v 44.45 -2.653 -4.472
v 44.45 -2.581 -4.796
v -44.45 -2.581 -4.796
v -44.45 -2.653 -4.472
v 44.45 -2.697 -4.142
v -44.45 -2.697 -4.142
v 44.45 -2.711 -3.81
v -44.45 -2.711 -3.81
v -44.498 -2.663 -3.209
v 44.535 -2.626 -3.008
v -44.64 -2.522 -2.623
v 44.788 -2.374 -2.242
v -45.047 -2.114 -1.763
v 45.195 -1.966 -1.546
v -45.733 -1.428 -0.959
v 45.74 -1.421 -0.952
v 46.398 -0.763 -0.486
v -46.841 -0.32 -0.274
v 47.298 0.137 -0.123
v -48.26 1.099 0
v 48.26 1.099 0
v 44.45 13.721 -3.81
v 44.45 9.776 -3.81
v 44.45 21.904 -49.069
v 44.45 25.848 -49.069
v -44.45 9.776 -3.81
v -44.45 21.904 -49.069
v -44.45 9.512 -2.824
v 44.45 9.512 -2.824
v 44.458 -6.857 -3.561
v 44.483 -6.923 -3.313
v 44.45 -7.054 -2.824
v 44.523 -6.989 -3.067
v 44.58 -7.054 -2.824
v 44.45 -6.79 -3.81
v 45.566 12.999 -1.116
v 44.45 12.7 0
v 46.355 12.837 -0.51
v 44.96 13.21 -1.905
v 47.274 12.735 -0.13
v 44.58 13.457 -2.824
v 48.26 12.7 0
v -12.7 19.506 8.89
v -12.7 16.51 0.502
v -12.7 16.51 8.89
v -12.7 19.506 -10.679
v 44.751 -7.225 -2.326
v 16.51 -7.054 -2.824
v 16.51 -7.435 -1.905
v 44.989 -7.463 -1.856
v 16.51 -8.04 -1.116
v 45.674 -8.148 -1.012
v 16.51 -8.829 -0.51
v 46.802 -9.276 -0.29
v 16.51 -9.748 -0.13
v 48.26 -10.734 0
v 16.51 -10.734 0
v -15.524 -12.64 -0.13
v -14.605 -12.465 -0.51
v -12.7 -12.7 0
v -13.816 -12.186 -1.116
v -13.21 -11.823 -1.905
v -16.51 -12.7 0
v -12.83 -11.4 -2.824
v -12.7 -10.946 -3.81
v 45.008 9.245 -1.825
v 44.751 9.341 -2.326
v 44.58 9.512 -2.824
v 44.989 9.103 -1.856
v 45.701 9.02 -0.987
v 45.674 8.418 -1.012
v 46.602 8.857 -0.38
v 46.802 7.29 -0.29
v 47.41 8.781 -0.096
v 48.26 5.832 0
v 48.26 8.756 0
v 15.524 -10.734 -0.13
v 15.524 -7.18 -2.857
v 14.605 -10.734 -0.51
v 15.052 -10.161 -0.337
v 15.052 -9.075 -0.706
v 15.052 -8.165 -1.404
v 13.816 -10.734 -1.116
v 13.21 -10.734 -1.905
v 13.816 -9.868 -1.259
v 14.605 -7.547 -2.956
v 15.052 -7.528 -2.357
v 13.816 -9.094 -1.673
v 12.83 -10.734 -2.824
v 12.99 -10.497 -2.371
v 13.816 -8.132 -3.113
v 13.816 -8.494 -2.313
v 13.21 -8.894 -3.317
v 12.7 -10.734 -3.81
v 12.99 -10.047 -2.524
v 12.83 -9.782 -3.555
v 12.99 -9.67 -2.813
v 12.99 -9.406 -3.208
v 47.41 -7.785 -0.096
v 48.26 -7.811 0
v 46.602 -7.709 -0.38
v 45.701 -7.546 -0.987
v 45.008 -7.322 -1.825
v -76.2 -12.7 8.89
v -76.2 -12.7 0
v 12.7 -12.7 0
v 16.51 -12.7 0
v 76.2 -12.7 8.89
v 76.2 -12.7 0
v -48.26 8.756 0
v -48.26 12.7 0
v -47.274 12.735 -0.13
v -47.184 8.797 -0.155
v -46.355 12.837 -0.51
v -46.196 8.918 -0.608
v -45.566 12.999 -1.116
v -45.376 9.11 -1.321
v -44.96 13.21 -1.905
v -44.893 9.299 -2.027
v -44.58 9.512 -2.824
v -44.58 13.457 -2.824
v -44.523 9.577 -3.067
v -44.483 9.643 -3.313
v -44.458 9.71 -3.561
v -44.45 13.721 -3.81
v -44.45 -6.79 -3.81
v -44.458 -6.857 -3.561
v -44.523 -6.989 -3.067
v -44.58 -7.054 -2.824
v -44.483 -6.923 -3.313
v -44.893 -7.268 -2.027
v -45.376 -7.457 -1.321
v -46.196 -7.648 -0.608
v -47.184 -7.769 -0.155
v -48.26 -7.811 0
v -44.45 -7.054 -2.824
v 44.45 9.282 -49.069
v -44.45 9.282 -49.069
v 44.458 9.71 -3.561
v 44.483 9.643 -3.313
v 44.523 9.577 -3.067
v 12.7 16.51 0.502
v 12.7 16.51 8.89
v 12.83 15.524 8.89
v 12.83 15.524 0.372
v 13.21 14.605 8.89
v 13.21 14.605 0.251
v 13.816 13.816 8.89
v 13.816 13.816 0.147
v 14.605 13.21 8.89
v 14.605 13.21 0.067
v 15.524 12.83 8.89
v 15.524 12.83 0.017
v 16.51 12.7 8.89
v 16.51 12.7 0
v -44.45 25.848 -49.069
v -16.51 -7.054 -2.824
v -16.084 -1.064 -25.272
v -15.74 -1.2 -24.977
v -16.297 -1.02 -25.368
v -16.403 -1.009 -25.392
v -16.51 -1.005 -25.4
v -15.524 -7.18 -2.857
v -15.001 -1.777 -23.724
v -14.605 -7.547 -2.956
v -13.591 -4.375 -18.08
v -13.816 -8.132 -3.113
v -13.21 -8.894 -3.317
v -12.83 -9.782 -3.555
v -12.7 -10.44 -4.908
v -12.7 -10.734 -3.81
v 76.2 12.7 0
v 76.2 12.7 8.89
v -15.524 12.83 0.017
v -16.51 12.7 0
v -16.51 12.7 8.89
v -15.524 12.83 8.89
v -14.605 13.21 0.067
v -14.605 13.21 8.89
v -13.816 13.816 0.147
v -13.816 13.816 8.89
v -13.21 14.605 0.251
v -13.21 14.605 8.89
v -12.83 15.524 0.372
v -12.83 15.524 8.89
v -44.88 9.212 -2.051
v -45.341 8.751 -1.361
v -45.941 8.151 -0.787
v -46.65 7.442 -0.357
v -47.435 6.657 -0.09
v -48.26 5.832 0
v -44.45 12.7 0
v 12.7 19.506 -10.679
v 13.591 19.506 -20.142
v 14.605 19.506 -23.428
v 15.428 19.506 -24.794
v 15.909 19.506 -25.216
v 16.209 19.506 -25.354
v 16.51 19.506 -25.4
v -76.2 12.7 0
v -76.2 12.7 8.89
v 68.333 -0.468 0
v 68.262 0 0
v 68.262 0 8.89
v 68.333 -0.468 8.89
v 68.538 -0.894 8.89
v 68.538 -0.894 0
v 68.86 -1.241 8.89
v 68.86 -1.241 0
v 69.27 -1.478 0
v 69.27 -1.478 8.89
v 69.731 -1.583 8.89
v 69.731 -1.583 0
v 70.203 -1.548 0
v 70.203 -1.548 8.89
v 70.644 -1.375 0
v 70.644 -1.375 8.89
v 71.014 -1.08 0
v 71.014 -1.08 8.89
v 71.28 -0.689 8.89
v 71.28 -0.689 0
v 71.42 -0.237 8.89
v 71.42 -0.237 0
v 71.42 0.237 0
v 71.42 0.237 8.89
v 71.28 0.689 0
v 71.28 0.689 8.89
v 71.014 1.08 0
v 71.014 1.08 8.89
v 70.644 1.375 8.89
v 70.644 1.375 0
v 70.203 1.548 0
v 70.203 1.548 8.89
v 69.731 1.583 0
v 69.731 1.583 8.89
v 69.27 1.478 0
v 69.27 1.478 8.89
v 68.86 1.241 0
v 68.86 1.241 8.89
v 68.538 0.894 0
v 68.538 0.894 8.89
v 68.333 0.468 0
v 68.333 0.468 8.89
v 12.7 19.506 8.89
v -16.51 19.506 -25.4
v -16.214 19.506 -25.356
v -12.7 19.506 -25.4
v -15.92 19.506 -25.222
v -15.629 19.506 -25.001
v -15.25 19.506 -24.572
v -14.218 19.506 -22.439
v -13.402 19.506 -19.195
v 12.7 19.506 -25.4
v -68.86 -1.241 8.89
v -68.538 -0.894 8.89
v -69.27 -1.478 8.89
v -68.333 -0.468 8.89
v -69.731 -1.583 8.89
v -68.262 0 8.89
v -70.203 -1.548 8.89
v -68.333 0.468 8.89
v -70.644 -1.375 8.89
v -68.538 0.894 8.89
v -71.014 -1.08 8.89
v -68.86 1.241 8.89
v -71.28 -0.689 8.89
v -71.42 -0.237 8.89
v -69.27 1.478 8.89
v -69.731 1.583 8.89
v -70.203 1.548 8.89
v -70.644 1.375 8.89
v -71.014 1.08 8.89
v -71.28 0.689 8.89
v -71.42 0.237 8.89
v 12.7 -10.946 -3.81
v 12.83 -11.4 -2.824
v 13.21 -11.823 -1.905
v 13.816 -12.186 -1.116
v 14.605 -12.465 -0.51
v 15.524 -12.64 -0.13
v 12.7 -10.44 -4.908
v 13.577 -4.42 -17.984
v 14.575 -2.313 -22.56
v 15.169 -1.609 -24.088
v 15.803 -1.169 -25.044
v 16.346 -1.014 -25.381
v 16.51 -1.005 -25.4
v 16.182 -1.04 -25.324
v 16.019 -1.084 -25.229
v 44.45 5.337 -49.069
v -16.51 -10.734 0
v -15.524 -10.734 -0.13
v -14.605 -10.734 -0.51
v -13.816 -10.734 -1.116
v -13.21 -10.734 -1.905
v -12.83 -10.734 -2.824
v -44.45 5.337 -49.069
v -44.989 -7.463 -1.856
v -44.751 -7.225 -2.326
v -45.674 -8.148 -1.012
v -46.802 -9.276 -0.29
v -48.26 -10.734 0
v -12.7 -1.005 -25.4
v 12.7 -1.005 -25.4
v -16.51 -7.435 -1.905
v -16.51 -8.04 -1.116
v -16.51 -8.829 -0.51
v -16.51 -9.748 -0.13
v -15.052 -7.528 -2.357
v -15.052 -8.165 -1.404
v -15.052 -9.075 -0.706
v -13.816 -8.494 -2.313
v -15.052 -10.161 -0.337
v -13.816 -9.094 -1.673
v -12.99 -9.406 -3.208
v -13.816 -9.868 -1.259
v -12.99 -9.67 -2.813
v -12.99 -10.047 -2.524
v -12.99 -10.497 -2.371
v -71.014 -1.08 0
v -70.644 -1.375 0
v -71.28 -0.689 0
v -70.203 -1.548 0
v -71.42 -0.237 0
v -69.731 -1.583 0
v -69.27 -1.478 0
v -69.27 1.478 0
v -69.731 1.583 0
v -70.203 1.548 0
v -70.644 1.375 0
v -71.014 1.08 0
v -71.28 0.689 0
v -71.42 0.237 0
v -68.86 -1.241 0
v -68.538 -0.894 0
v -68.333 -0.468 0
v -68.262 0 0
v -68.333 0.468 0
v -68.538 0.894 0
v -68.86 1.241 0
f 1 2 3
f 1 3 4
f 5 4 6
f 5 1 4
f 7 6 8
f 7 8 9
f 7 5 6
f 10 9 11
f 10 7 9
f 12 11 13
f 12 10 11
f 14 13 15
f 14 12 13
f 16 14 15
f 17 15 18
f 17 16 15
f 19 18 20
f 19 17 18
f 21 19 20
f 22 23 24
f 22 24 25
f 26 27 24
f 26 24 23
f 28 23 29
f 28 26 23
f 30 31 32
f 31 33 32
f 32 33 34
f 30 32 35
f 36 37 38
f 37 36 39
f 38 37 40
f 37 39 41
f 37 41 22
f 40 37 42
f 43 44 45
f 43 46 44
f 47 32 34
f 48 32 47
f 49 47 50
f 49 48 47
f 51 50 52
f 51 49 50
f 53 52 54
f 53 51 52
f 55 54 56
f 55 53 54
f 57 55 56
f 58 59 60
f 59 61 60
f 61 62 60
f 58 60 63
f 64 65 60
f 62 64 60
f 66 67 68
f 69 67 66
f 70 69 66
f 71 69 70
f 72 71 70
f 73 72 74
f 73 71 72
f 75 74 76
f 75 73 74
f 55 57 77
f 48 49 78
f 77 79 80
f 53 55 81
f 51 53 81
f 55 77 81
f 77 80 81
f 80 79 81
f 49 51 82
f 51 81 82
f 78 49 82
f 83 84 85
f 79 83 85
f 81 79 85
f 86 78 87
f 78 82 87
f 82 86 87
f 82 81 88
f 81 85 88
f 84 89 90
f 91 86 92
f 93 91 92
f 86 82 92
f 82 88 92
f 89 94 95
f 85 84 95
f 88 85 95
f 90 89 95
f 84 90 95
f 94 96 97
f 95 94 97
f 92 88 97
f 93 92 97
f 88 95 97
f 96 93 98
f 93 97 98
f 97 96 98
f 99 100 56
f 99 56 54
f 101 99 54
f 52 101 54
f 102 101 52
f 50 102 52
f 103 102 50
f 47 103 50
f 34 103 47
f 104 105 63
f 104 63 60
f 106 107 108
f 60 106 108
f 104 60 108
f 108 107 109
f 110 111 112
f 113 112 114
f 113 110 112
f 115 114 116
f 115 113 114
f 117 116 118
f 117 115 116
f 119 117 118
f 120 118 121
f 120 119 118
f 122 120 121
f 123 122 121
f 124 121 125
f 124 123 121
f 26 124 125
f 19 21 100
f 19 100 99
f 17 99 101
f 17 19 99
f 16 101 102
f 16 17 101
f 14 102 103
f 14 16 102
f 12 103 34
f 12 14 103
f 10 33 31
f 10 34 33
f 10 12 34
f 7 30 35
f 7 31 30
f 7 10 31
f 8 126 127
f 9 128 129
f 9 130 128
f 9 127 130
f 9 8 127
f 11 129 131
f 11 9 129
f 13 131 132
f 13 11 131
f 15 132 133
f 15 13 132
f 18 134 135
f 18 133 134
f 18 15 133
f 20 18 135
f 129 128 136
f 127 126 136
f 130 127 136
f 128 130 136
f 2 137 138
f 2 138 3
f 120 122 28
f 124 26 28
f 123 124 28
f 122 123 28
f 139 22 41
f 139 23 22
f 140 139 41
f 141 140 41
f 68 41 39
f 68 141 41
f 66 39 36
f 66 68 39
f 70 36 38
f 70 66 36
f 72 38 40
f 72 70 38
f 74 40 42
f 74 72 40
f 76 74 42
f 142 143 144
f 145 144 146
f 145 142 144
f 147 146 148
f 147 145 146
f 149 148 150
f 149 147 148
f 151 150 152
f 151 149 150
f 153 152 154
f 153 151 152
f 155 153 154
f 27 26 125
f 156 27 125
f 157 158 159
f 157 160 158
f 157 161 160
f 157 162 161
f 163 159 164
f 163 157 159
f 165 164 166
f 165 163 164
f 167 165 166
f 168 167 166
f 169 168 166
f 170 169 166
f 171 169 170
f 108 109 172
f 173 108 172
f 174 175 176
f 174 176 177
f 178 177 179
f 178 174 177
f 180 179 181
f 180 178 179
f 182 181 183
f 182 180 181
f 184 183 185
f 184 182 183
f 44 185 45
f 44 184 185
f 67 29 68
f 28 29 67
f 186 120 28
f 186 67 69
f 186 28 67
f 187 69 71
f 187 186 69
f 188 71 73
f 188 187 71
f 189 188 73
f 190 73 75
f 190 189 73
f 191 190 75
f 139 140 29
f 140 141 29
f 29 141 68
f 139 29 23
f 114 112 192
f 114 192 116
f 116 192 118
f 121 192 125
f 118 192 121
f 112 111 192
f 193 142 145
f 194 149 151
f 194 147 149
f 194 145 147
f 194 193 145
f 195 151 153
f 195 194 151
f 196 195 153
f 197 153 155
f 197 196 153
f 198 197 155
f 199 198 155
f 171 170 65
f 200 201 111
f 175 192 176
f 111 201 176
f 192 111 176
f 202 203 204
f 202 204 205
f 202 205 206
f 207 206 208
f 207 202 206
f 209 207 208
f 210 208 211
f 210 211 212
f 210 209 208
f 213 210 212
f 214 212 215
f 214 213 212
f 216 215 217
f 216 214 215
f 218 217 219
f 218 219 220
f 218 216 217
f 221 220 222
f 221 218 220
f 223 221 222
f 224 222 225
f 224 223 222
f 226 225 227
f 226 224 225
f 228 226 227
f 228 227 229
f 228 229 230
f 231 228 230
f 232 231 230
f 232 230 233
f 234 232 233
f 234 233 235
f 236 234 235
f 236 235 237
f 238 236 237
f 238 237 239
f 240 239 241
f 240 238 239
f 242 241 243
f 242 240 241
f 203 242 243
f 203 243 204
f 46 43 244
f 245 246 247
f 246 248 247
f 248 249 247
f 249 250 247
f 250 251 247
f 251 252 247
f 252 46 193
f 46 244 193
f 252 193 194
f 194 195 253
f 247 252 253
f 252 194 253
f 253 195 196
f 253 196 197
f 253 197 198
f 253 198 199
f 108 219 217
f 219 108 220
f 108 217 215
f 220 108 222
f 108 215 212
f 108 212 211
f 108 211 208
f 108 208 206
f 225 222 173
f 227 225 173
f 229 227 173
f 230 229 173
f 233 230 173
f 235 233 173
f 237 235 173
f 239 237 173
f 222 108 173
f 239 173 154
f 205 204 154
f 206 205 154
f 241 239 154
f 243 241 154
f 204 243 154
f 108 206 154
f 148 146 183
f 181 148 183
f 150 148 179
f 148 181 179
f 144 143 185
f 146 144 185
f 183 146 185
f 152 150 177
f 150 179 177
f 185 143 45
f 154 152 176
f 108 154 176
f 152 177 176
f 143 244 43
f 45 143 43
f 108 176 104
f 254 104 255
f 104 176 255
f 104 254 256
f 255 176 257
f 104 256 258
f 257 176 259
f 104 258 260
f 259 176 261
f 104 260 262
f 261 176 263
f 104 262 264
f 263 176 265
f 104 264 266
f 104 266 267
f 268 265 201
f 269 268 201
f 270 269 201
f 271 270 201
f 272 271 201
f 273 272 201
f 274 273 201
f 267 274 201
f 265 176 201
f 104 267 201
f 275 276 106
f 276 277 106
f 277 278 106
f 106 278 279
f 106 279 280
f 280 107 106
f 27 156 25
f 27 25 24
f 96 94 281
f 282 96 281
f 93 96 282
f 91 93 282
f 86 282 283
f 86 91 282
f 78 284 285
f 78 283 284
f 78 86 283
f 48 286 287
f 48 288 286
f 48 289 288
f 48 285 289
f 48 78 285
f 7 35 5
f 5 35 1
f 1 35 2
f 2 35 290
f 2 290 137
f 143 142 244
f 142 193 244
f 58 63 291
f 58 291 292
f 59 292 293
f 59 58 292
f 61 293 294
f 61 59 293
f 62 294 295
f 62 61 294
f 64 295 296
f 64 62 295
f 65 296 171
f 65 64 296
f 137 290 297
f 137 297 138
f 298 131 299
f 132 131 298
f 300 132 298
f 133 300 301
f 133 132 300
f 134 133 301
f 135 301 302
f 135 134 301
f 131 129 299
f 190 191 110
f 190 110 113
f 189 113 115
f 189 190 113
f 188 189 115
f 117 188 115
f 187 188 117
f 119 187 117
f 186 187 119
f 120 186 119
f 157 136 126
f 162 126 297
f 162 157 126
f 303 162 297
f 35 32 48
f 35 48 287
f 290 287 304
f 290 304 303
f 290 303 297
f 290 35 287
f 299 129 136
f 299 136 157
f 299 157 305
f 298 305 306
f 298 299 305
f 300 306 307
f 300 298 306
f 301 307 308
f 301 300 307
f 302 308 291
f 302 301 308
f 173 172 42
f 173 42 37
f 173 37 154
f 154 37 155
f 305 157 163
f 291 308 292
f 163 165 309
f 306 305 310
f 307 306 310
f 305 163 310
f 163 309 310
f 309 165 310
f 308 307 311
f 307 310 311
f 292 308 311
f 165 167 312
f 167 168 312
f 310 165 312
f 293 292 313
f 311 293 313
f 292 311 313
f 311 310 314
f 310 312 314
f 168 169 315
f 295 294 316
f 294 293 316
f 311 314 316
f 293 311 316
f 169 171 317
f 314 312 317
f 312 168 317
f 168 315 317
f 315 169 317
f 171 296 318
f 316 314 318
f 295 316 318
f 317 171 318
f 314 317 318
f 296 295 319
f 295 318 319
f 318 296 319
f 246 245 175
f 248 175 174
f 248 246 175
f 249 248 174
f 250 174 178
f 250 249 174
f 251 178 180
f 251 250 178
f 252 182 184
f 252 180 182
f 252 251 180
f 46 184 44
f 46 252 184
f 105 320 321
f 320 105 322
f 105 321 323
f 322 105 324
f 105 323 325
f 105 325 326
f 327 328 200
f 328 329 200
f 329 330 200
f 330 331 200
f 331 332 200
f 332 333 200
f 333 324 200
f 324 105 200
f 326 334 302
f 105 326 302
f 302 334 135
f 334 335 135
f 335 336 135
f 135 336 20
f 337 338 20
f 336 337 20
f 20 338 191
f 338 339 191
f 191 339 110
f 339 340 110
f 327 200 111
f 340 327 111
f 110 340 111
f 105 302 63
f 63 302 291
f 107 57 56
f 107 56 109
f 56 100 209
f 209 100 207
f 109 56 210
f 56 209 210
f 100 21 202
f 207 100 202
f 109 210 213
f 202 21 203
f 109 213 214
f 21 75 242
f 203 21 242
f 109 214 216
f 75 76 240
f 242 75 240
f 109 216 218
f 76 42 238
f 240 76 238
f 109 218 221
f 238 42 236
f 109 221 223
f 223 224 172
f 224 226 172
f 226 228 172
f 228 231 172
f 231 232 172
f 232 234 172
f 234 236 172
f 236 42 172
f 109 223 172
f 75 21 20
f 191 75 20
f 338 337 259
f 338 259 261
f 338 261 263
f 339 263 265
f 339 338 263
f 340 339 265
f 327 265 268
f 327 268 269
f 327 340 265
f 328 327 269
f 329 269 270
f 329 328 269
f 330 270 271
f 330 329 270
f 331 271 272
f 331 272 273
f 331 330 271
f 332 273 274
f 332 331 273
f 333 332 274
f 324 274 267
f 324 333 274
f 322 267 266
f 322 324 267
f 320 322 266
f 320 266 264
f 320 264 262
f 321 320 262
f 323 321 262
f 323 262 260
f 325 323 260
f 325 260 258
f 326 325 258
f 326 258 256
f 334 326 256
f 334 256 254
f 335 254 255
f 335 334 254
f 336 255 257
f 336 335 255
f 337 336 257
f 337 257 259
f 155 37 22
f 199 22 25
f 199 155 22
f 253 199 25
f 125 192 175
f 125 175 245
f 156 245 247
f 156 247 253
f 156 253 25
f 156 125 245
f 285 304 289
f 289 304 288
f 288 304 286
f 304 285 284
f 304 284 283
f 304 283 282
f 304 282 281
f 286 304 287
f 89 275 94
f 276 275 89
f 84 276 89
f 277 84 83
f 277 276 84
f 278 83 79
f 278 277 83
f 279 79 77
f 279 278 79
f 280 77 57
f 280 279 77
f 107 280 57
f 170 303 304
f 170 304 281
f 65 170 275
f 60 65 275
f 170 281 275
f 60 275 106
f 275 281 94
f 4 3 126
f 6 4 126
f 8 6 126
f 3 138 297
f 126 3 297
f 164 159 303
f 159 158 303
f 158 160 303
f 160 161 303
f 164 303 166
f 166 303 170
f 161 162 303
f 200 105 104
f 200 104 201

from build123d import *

# Parameters (mm, degrees)
SKETCH1_W           = 152.4
SKETCH1_H           = 25.4
SKETCH1_R           = 1.5875
BOSS_EXTRUDE1_DEPTH = 8.89
BOSS_EXTRUDE2_DEPTH = 44.45
BOSS_EXTRUDE3_DEPTH = 12.7
FILLET1_R           = 3.81


with BuildPart() as part:
    # Sketch1 → Boss-Extrude1 (new body)
    with BuildSketch(Plane.XY):
        Rectangle(SKETCH1_W, SKETCH1_H)
        with Locations((-69.85, 0)):
            Circle(SKETCH1_R, mode=Mode.SUBTRACT)
        with Locations(Location((69.85, 0, 0), (0, 0, 180))):
            Circle(SKETCH1_R, mode=Mode.SUBTRACT)
    extrude(amount=BOSS_EXTRUDE1_DEPTH)

    # Sketch2 → Boss-Extrude2 (add, symmetric)
    with BuildSketch(Plane(origin=(0, 0, 0), x_dir=(0, 0, -1), z_dir=(1, 0, 0))):
        Polygon((0, 8.755597753), (0, 12.7), (49.069031975, 25.848007491), (49.069031975, 21.903605244), align=None)
        Polygon((0, -3.866489439), (0, -7.810891686), (49.069031975, 5.337115805), (49.069031975, 9.281518052), align=None)
    extrude(amount=BOSS_EXTRUDE2_DEPTH, both=True)

    # Sketch3 → Boss-Extrude3 (add, symmetric)
    with BuildSketch(Plane(origin=(0, 0, 0), x_dir=(0, 0, -1), z_dir=(1, 0, 0))):
        Polygon((-8.89, 12.7), (-8.89, 19.505909488), (25.4, 19.505909488), (0, 12.7), align=None)
        Polygon((25.4, -1.004982199), (0, -12.7), (0, -7.810891686), align=None)
    extrude(amount=BOSS_EXTRUDE3_DEPTH, both=True)

    # Fillet1
    # the kernel refuses this fillet: 3.81 mm, written as the material it adds along each edge
    with BuildSketch(Plane(origin=(16.51, -10.73440751, -3.81), x_dir=(0, 0, 1), z_dir=(-1, 0, 0))) as fillet1_piece_1_section:
        Polygon((0, 0), (FILLET1_R, 0), (FILLET1_R, FILLET1_R * 0.767326987979), (FILLET1_R * 0.258819045103, FILLET1_R * 0.965925826289), align=None)
    fillet1_piece_1 = extrude(amount=FILLET1_R, mode=Mode.PRIVATE)
    fillet1_piece_1 = fillet1_piece_1 - Plane(origin=(16.51, -10.73440751, -3.81), x_dir=(0, -0.6087614290087219, -0.7933533402912344), z_dir=(-1, 0, 0)) * Sphere(FILLET1_R, mode=Mode.PRIVATE)
    add(fillet1_piece_1)
    with BuildSketch(Plane(origin=(-16.51, -10.73440751, -3.81), x_dir=(0, 0, 1), z_dir=(1, 0, 0))) as fillet1_piece_2_section:
        Polygon((0, 0), (FILLET1_R, 0), (FILLET1_R, -FILLET1_R * 0.767326987979), (FILLET1_R * 0.258819045103, -FILLET1_R * 0.965925826289), align=None)
    fillet1_piece_2 = extrude(amount=FILLET1_R, mode=Mode.PRIVATE)
    fillet1_piece_2 = fillet1_piece_2 - Plane(origin=(-16.51, -10.73440751, -3.81), x_dir=(0, -0.6087614290087219, -0.7933533402912344), z_dir=(1, 0, 0)) * Sphere(FILLET1_R, mode=Mode.PRIVATE)
    add(fillet1_piece_2)
    with BuildSketch(Plane(origin=(-44.45, 8.755597753, 0), x_dir=(0, -1, 0), z_dir=(1, 0, 0))) as fillet1_piece_3:
        with BuildLine():
            CenterArc((FILLET1_R * 0.767326987979, FILLET1_R), FILLET1_R, 195, 75)
            Line((-FILLET1_R * 0.19859883831, FILLET1_R * 0.741180954897), (0, 0))
            Line((0, 0), (FILLET1_R * 0.767326987979, 0))
        make_face()
    extrude(amount=88.9)
    with BuildSketch(Plane(origin=(-44.45, -0.769402247, 0), x_dir=(-1, 0, 0), z_dir=(0, 1, 0))) as fillet1_piece_4_section:
        with BuildLine():
            CenterArc((FILLET1_R, -FILLET1_R), FILLET1_R, 90, 90)
            Line((0, -FILLET1_R), (0, 0))
            Line((0, 0), (FILLET1_R, 0))
        make_face()
    fillet1_piece_4 = extrude(amount=13.469402247, mode=Mode.PRIVATE)
    fillet1_piece_4 = split(fillet1_piece_4, bisect_by=Plane(origin=(-45.341111067, 12.778682572, -0.293647356), z_dir=(0, -0.9659258262890691, -0.25881904510251785)), keep=Keep.TOP, mode=Mode.PRIVATE)
    fillet1_piece_4 = split(fillet1_piece_4, bisect_by=Plane(origin=(-45.341111067, 9.098505174, -1.279747918), z_dir=(0, 0.9659258262890691, 0.258819045102518)), keep=Keep.TOP, mode=Mode.PRIVATE)
    add(fillet1_piece_4)
    with BuildSketch(Plane(origin=(-44.45, -0.769402247, 0), x_dir=(-1, 0, 0), z_dir=(0, 1, 0))) as fillet1_piece_5_section:
        with BuildLine():
            CenterArc((FILLET1_R, -FILLET1_R), FILLET1_R, 90, 90)
            Line((0, -FILLET1_R), (0, 0))
            Line((0, 0), (FILLET1_R, 0))
        make_face()
    fillet1_piece_5 = extrude(amount=22.994402247, mode=Mode.PRIVATE)
    fillet1_piece_5 = split(fillet1_piece_5, bisect_by=Plane(origin=(-44.855660273, 12.7, -1.638749777), z_dir=(0, 1, 0)), keep=Keep.TOP, mode=Mode.PRIVATE)
    fillet1_piece_5 = split(fillet1_piece_5, bisect_by=Plane(origin=(-44.855660273, 13.124394562, -1.583862067), z_dir=(0, -0.9659258262890691, -0.25881904510251785)), keep=Keep.TOP, mode=Mode.PRIVATE)
    add(fillet1_piece_5)
    with BuildSketch(Plane(origin=(44.45, -0.769402247, 0), x_dir=(1, 0, 0), z_dir=(0, 1, 0))) as fillet1_piece_6_section:
        with BuildLine():
            CenterArc((FILLET1_R, FILLET1_R), FILLET1_R, 180, 90)
            Line((0, FILLET1_R), (0, 0))
            Line((0, 0), (FILLET1_R, 0))
        make_face()
    fillet1_piece_6 = extrude(amount=13.469402247, mode=Mode.PRIVATE)
    fillet1_piece_6 = split(fillet1_piece_6, bisect_by=Plane(origin=(45.341111067, 9.098505174, -1.279747918), z_dir=(0, 0.9659258262890691, 0.258819045102518)), keep=Keep.TOP, mode=Mode.PRIVATE)
    fillet1_piece_6 = split(fillet1_piece_6, bisect_by=Plane(origin=(45.341111067, 12.778682572, -0.293647356), z_dir=(0, -0.9659258262890691, -0.25881904510251785)), keep=Keep.TOP, mode=Mode.PRIVATE)
    add(fillet1_piece_6)
    with BuildSketch(Plane(origin=(44.45, -0.769402247, 0), x_dir=(1, 0, 0), z_dir=(0, 1, 0))) as fillet1_piece_7_section:
        with BuildLine():
            CenterArc((FILLET1_R, FILLET1_R), FILLET1_R, 180, 90)
            Line((0, FILLET1_R), (0, 0))
            Line((0, 0), (FILLET1_R, 0))
        make_face()
    fillet1_piece_7 = extrude(amount=22.994402247, mode=Mode.PRIVATE)
    fillet1_piece_7 = split(fillet1_piece_7, bisect_by=Plane(origin=(44.855660273, 12.7, -1.638749777), z_dir=(0, 1, 0)), keep=Keep.TOP, mode=Mode.PRIVATE)
    fillet1_piece_7 = split(fillet1_piece_7, bisect_by=Plane(origin=(44.855660273, 13.124394562, -1.583862067), z_dir=(0, -0.9659258262890691, -0.25881904510251785)), keep=Keep.TOP, mode=Mode.PRIVATE)
    add(fillet1_piece_7)
    with BuildSketch(Plane(origin=(-44.45, 5.658510561, 0), x_dir=(-1, 0, 0), z_dir=(0, -1, 0))) as fillet1_piece_8_section:
        with BuildLine():
            CenterArc((FILLET1_R, FILLET1_R), FILLET1_R, 180, 90)
            Line((0, FILLET1_R), (0, 0))
            Line((0, 0), (FILLET1_R, 0))
        make_face()
    fillet1_piece_8 = extrude(amount=22.994402247, mode=Mode.PRIVATE)
    fillet1_piece_8 = split(fillet1_piece_8, bisect_by=Plane(origin=(-45.312565385, -7.447655563, -1.355615666), z_dir=(0, 0.9659258262890691, 0.25881904510251813)), keep=Keep.TOP, mode=Mode.PRIVATE)
    fillet1_piece_8 = split(fillet1_piece_8, bisect_by=Plane(origin=(-45.312565385, -3.767478165, -0.369515104), z_dir=(0, -0.9659258262890691, -0.2588190451025181)), keep=Keep.TOP, mode=Mode.PRIVATE)
    add(fillet1_piece_8)
    with BuildSketch(Plane(origin=(44.45, -3.866489439, 0), x_dir=(0, 1, 0), z_dir=(-1, 0, 0))) as fillet1_piece_9:
        with BuildLine():
            CenterArc((FILLET1_R * 1.30322537284, FILLET1_R), FILLET1_R, 165, 105)
            Line((FILLET1_R * 0.337299546552, FILLET1_R * 1.2588190451), (0, 0))
            Line((0, 0), (FILLET1_R * 1.30322537284, 0))
        make_face()
    extrude(amount=88.9)
    with BuildSketch(Plane(origin=(16.51, -7.810891686, 0), x_dir=(0, -1, 0), z_dir=(1, 0, 0)), Plane(origin=(-44.45, -7.810891686, 0), x_dir=(0, -1, 0), z_dir=(1, 0, 0))) as fillet1_piece_10:
        with BuildLine():
            CenterArc((FILLET1_R * 0.767326987979, FILLET1_R), FILLET1_R, 195, 75)
            Line((-FILLET1_R * 0.19859883831, FILLET1_R * 0.741180954897), (0, 0))
            Line((0, 0), (FILLET1_R * 0.767326987979, 0))
        make_face()
    extrude(amount=27.94)
    with BuildSketch(Plane(origin=(44.45, 5.658510561, 0), x_dir=(1, 0, 0), z_dir=(0, -1, 0))) as fillet1_piece_11_section:
        with BuildLine():
            CenterArc((FILLET1_R, -FILLET1_R), FILLET1_R, 90, 90)
            Line((0, -FILLET1_R), (0, 0))
            Line((0, 0), (FILLET1_R, 0))
        make_face()
    fillet1_piece_11 = extrude(amount=22.994402247, mode=Mode.PRIVATE)
    fillet1_piece_11 = split(fillet1_piece_11, bisect_by=Plane(origin=(45.312565385, -7.447655563, -1.355615666), z_dir=(0, 0.9659258262890691, 0.25881904510251813)), keep=Keep.TOP, mode=Mode.PRIVATE)
    fillet1_piece_11 = split(fillet1_piece_11, bisect_by=Plane(origin=(45.312565385, -3.767478165, -0.369515104), z_dir=(0, -0.9659258262890691, -0.2588190451025181)), keep=Keep.TOP, mode=Mode.PRIVATE)
    add(fillet1_piece_11)
    with BuildSketch(Plane(origin=(-12.7, 12.7, -9.525), x_dir=(-1, 0, 0), z_dir=(0, 0, 1))) as fillet1_piece_12:
        with BuildLine():
            CenterArc((FILLET1_R, -FILLET1_R), FILLET1_R, 90, 90)
            Line((0, -FILLET1_R), (0, 0))
            Line((0, 0), (FILLET1_R, 0))
        make_face()
    extrude(amount=18.415)
    with BuildSketch(Plane(origin=(-12.7, 21.971160892, -34.600443495), x_dir=(0, 0.9659258262890691, 0.2588190451025179), z_dir=(0, -0.2588190451025179, 0.9659258262890691))) as fillet1_piece_13_section:
        with BuildLine():
            CenterArc((FILLET1_R, FILLET1_R), FILLET1_R, 180, 90)
            Line((0, FILLET1_R), (0, 0))
            Line((0, 0), (FILLET1_R, 0))
        make_face()
    fillet1_piece_13 = extrude(amount=45.346014982, mode=Mode.PRIVATE)
    fillet1_piece_13 = split(fillet1_piece_13, bisect_by=Plane(origin=(-13.567705221, 16.120661603, 8.89), z_dir=(0, 0, -1)), keep=Keep.TOP, mode=Mode.PRIVATE)
    fillet1_piece_13 = split(fillet1_piece_13, bisect_by=Plane(origin=(-13.567705221, 19.505909488, -9.486038737), z_dir=(0, -1, 0)), keep=Keep.TOP, mode=Mode.PRIVATE)
    add(fillet1_piece_13)
    with BuildSketch(Plane(origin=(12.7, 12.7, -9.525), x_dir=(1, 0, 0), z_dir=(0, 0, 1))) as fillet1_piece_14:
        with BuildLine():
            CenterArc((FILLET1_R, FILLET1_R), FILLET1_R, 180, 90)
            Line((0, FILLET1_R), (0, 0))
            Line((0, 0), (FILLET1_R, 0))
        make_face()
    extrude(amount=18.415)
    with BuildSketch(Plane(origin=(12.7, 21.971160892, -34.600443495), x_dir=(1, 0, 0), z_dir=(0, -0.2588190451025179, 0.9659258262890691))) as fillet1_piece_15_section:
        with BuildLine():
            CenterArc((FILLET1_R, FILLET1_R), FILLET1_R, 180, 90)
            Line((0, FILLET1_R), (0, 0))
            Line((0, 0), (FILLET1_R, 0))
        make_face()
    fillet1_piece_15 = extrude(amount=45.346014982, mode=Mode.PRIVATE)
    fillet1_piece_15 = split(fillet1_piece_15, bisect_by=Plane(origin=(13.56770522, 16.120661606, 8.89), z_dir=(0, 0, -1)), keep=Keep.TOP, mode=Mode.PRIVATE)
    fillet1_piece_15 = split(fillet1_piece_15, bisect_by=Plane(origin=(13.56770522, 19.505909488, -9.486038751), z_dir=(0, -1, 0)), keep=Keep.TOP, mode=Mode.PRIVATE)
    add(fillet1_piece_15)
    with BuildSketch(Plane(origin=(-12.7, -7.054230112, -2.823899438), x_dir=(-1, 0, 0), z_dir=(0, 0.2588190451025182, -0.965925826289069))) as fillet1_piece_16_section:
        with BuildLine():
            CenterArc((FILLET1_R, -FILLET1_R), FILLET1_R, 90, 90)
            Line((0, -FILLET1_R), (0, 0))
            Line((0, 0), (FILLET1_R, 0))
        make_face()
    fillet1_piece_16 = extrude(amount=32.897499158, mode=Mode.PRIVATE)
    fillet1_piece_16 = split(fillet1_piece_16, bisect_by=Plane(origin=(-13.689407804, -6.647394043, -13.145443122), z_dir=(0, 0.9083408023896492, 0.41823078164349436)), keep=Keep.TOP, mode=Mode.PRIVATE)
    add(fillet1_piece_16)
    with BuildSketch(Plane(origin=(-12.7, -12.7, 0), x_dir=(-1, 0, 0), z_dir=(0, 1, 0))) as fillet1_piece_17_section:
        with BuildLine():
            CenterArc((FILLET1_R, -FILLET1_R), FILLET1_R, 90, 90)
            Line((0, -FILLET1_R), (0, 0))
            Line((0, 0), (FILLET1_R, 0))
        make_face()
    fillet1_piece_17 = extrude(amount=1.96559249, mode=Mode.PRIVATE)
    fillet1_piece_17 = split(fillet1_piece_17, bisect_by=Plane(origin=(-13.67877404, -12.248464892, -0.980673303), z_dir=(0, 0.9083408023896492, 0.41823078164349436)), keep=Keep.TOP, mode=Mode.PRIVATE)
    add(fillet1_piece_17)
    with BuildSketch(Plane(origin=(12.7, -7.054230112, -2.823899438), x_dir=(0, -0.965925826289069, -0.2588190451025182), z_dir=(0, 0.2588190451025182, -0.965925826289069))) as fillet1_piece_18_section:
        with BuildLine():
            CenterArc((FILLET1_R, -FILLET1_R), FILLET1_R, 90, 90)
            Line((0, -FILLET1_R), (0, 0))
            Line((0, 0), (FILLET1_R, 0))
        make_face()
    fillet1_piece_18 = extrude(amount=32.897499158, mode=Mode.PRIVATE)
    fillet1_piece_18 = split(fillet1_piece_18, bisect_by=Plane(origin=(13.689407804, -6.647394043, -13.145443122), z_dir=(0, 0.9083408023896492, 0.41823078164349436)), keep=Keep.TOP, mode=Mode.PRIVATE)
    add(fillet1_piece_18)
    with BuildSketch(Plane(origin=(12.7, -12.7, 0), x_dir=(1, 0, 0), z_dir=(0, 1, 0))) as fillet1_piece_19_section:
        with BuildLine():
            CenterArc((FILLET1_R, FILLET1_R), FILLET1_R, 180, 90)
            Line((0, FILLET1_R), (0, 0))
            Line((0, 0), (FILLET1_R, 0))
        make_face()
    fillet1_piece_19 = extrude(amount=1.96559249, mode=Mode.PRIVATE)
    fillet1_piece_19 = split(fillet1_piece_19, bisect_by=Plane(origin=(13.67877404, -12.248464892, -0.980673303), z_dir=(0, 0.9083408023896492, 0.41823078164349436)), keep=Keep.TOP, mode=Mode.PRIVATE)
    add(fillet1_piece_19)
    with BuildSketch(Plane(origin=(-44.45, -0.769402247, 0), x_dir=(-1, 0, 0), z_dir=(0, 1, 0))) as fillet1_piece_20a_section:
        with BuildLine():
            CenterArc((FILLET1_R, -FILLET1_R), FILLET1_R, 90, 90)
            Line((0, -FILLET1_R), (0, 0))
            Line((0, 0), (FILLET1_R, 0))
        make_face()
    fillet1_piece_20a = extrude(amount=13.469402247, mode=Mode.PRIVATE)
    fillet1_piece_20a = split(fillet1_piece_20a, bisect_by=Plane(origin=(-45.301618927, 8.664751894, 0.339041359), z_dir=(0, -0.9659258262890691, -0.258819045102518)), keep=Keep.TOP, mode=Mode.PRIVATE)
    with BuildSketch(Plane(origin=(-51.75878956, 8.755597753, 0), x_dir=(0, -1, 0), z_dir=(1, 0, 0))) as fillet1_piece_20b_section:
        with BuildLine():
            CenterArc((FILLET1_R * 0.767326987979, FILLET1_R), FILLET1_R, 195, 75)
            Line((-FILLET1_R * 0.19859883831, FILLET1_R * 0.741180954897), (0, 0))
            Line((0, 0), (FILLET1_R * 0.767326987979, 0))
        make_face()
    fillet1_piece_20b = extrude(amount=96.20878956, mode=Mode.PRIVATE)
    fillet1_piece_20b = split(fillet1_piece_20b, bisect_by=Plane(origin=(-44.45, 8.277292098, -0.623340065), z_dir=(-1, 0, 0)), keep=Keep.TOP, mode=Mode.PRIVATE)
    fillet1_piece_20 = fillet1_piece_20a & fillet1_piece_20b
    add(fillet1_piece_20)
    with BuildSketch(Plane(origin=(-44.45, 8.755597753, 0), x_dir=(0, -1, 0), z_dir=(1, 0, 0))) as fillet1_piece_21a_section:
        with BuildLine():
            CenterArc((FILLET1_R * 0.767326987979, FILLET1_R), FILLET1_R, 195, 75)
            Line((-FILLET1_R * 0.19859883831, FILLET1_R * 0.741180954897), (0, 0))
            Line((0, 0), (FILLET1_R * 0.767326987979, 0))
        make_face()
    fillet1_piece_21a = extrude(amount=96.20878956, mode=Mode.PRIVATE)
    fillet1_piece_21a = split(fillet1_piece_21a, bisect_by=Plane(origin=(44.45, 8.277292098, -0.623340065), z_dir=(1, 0, 0)), keep=Keep.TOP, mode=Mode.PRIVATE)
    with BuildSketch(Plane(origin=(44.45, -0.769402247, 0), x_dir=(1, 0, 0), z_dir=(0, 1, 0))) as fillet1_piece_21b_section:
        with BuildLine():
            CenterArc((FILLET1_R, FILLET1_R), FILLET1_R, 180, 90)
            Line((0, FILLET1_R), (0, 0))
            Line((0, 0), (FILLET1_R, 0))
        make_face()
    fillet1_piece_21b = extrude(amount=13.469402247, mode=Mode.PRIVATE)
    fillet1_piece_21b = split(fillet1_piece_21b, bisect_by=Plane(origin=(45.301618927, 8.664751894, 0.339041359), z_dir=(0, -0.9659258262890691, -0.258819045102518)), keep=Keep.TOP, mode=Mode.PRIVATE)
    fillet1_piece_21 = fillet1_piece_21a & fillet1_piece_21b
    add(fillet1_piece_21)
    with BuildSketch(Plane(origin=(44.45, -3.866489439, 0), x_dir=(0, 1, 0), z_dir=(-1, 0, 0))) as fillet1_piece_22a_section:
        with BuildLine():
            CenterArc((FILLET1_R * 1.30322537284, FILLET1_R), FILLET1_R, 165, 105)
            Line((FILLET1_R * 0.337299546552, FILLET1_R * 1.2588190451), (0, 0))
            Line((0, 0), (FILLET1_R * 1.30322537284, 0))
        make_face()
    fillet1_piece_22a = extrude(amount=101.313221676, mode=Mode.PRIVATE)
    fillet1_piece_22a = split(fillet1_piece_22a, bisect_by=Plane(origin=(-44.45, -2.401293956, -1.124284037), z_dir=(-1, 0, 0)), keep=Keep.TOP, mode=Mode.PRIVATE)
    with BuildSketch(Plane(origin=(-44.45, 5.658510561, 0), x_dir=(-1, 0, 0), z_dir=(0, -1, 0))) as fillet1_piece_22b_section:
        with BuildLine():
            CenterArc((FILLET1_R, FILLET1_R), FILLET1_R, 180, 90)
            Line((0, FILLET1_R), (0, 0))
            Line((0, 0), (FILLET1_R, 0))
        make_face()
    fillet1_piece_22b = extrude(amount=22.994402247, mode=Mode.PRIVATE)
    fillet1_piece_22b = split(fillet1_piece_22b, bisect_by=Plane(origin=(-45.324056285, -3.329117204, -2.005500483), z_dir=(0, 0.9659258262890691, 0.2588190451025181)), keep=Keep.TOP, mode=Mode.PRIVATE)
    fillet1_piece_22 = fillet1_piece_22a & fillet1_piece_22b
    add(fillet1_piece_22)
    with BuildSketch(Plane(origin=(-44.45, 5.658510561, 0), x_dir=(-1, 0, 0), z_dir=(0, -1, 0))) as fillet1_piece_23a_section:
        with BuildLine():
            CenterArc((FILLET1_R, FILLET1_R), FILLET1_R, 180, 90)
            Line((0, FILLET1_R), (0, 0))
            Line((0, 0), (FILLET1_R, 0))
        make_face()
    fillet1_piece_23a = extrude(amount=22.994402247, mode=Mode.PRIVATE)
    fillet1_piece_23a = split(fillet1_piece_23a, bisect_by=Plane(origin=(-45.291707933, -12.7, -0.897871299), z_dir=(0, 1, 0)), keep=Keep.TOP, mode=Mode.PRIVATE)
    fillet1_piece_23a = split(fillet1_piece_23a, bisect_by=Plane(origin=(-45.291707933, -7.742119907, -0.256659773), z_dir=(0, -0.9659258262890691, -0.25881904510251813)), keep=Keep.TOP, mode=Mode.PRIVATE)
    with BuildSketch(Plane(origin=(-51.75878956, -7.810891686, 0), x_dir=(0, -1, 0), z_dir=(1, 0, 0))) as fillet1_piece_23b_section:
        with BuildLine():
            CenterArc((FILLET1_R * 0.767326987979, FILLET1_R), FILLET1_R, 195, 75)
            Line((-FILLET1_R * 0.19859883831, FILLET1_R * 0.741180954897), (0, 0))
            Line((0, 0), (FILLET1_R * 0.767326987979, 0))
        make_face()
    fillet1_piece_23b = extrude(amount=35.24878956, mode=Mode.PRIVATE)
    fillet1_piece_23b = split(fillet1_piece_23b, bisect_by=Plane(origin=(-44.45, -8.289197341, -0.623340065), z_dir=(-1, 0, 0)), keep=Keep.TOP, mode=Mode.PRIVATE)
    fillet1_piece_23 = fillet1_piece_23a & fillet1_piece_23b
    add(fillet1_piece_23)
    with BuildSketch(Plane(origin=(44.45, 5.658510561, 0), x_dir=(1, 0, 0), z_dir=(0, -1, 0))) as fillet1_piece_24a_section:
        with BuildLine():
            CenterArc((FILLET1_R, -FILLET1_R), FILLET1_R, 90, 90)
            Line((0, -FILLET1_R), (0, 0))
            Line((0, 0), (FILLET1_R, 0))
        make_face()
    fillet1_piece_24a = extrude(amount=22.994402247, mode=Mode.PRIVATE)
    fillet1_piece_24a = split(fillet1_piece_24a, bisect_by=Plane(origin=(45.324056285, -3.329117204, -2.005500483), z_dir=(0, 0.9659258262890691, 0.2588190451025181)), keep=Keep.TOP, mode=Mode.PRIVATE)
    with BuildSketch(Plane(origin=(56.863221676, -3.866489439, 0), x_dir=(0, 1, 0), z_dir=(-1, 0, 0))) as fillet1_piece_24b_section:
        with BuildLine():
            CenterArc((FILLET1_R * 1.30322537284, FILLET1_R), FILLET1_R, 165, 105)
            Line((FILLET1_R * 0.337299546552, FILLET1_R * 1.2588190451), (0, 0))
            Line((0, 0), (FILLET1_R * 1.30322537284, 0))
        make_face()
    fillet1_piece_24b = extrude(amount=101.313221676, mode=Mode.PRIVATE)
    fillet1_piece_24b = split(fillet1_piece_24b, bisect_by=Plane(origin=(44.45, -2.401293956, -1.124284037), z_dir=(1, 0, 0)), keep=Keep.TOP, mode=Mode.PRIVATE)
    fillet1_piece_24 = fillet1_piece_24a & fillet1_piece_24b
    add(fillet1_piece_24)
    with BuildSketch(Plane(origin=(16.51, -7.810891686, 0), x_dir=(0, -1, 0), z_dir=(1, 0, 0))) as fillet1_piece_25a_section:
        with BuildLine():
            CenterArc((FILLET1_R * 0.767326987979, FILLET1_R), FILLET1_R, 195, 75)
            Line((-FILLET1_R * 0.19859883831, FILLET1_R * 0.741180954897), (0, 0))
            Line((0, 0), (FILLET1_R * 0.767326987979, 0))
        make_face()
    fillet1_piece_25a = extrude(amount=35.24878956, mode=Mode.PRIVATE)
    fillet1_piece_25a = split(fillet1_piece_25a, bisect_by=Plane(origin=(44.45, -8.289197341, -0.623340065), z_dir=(1, 0, 0)), keep=Keep.TOP, mode=Mode.PRIVATE)
    with BuildSketch(Plane(origin=(44.45, 5.658510561, 0), x_dir=(1, 0, 0), z_dir=(0, -1, 0))) as fillet1_piece_25b_section:
        with BuildLine():
            CenterArc((FILLET1_R, -FILLET1_R), FILLET1_R, 90, 90)
            Line((0, -FILLET1_R), (0, 0))
            Line((0, 0), (FILLET1_R, 0))
        make_face()
    fillet1_piece_25b = extrude(amount=22.994402247, mode=Mode.PRIVATE)
    fillet1_piece_25b = split(fillet1_piece_25b, bisect_by=Plane(origin=(45.291707933, -12.7, -0.897871299), z_dir=(0, 1, 0)), keep=Keep.TOP, mode=Mode.PRIVATE)
    fillet1_piece_25b = split(fillet1_piece_25b, bisect_by=Plane(origin=(45.291707933, -7.742119907, -0.256659773), z_dir=(0, -0.9659258262890691, -0.25881904510251813)), keep=Keep.TOP, mode=Mode.PRIVATE)
    fillet1_piece_25 = fillet1_piece_25a & fillet1_piece_25b
    add(fillet1_piece_25)


solid = part.part
